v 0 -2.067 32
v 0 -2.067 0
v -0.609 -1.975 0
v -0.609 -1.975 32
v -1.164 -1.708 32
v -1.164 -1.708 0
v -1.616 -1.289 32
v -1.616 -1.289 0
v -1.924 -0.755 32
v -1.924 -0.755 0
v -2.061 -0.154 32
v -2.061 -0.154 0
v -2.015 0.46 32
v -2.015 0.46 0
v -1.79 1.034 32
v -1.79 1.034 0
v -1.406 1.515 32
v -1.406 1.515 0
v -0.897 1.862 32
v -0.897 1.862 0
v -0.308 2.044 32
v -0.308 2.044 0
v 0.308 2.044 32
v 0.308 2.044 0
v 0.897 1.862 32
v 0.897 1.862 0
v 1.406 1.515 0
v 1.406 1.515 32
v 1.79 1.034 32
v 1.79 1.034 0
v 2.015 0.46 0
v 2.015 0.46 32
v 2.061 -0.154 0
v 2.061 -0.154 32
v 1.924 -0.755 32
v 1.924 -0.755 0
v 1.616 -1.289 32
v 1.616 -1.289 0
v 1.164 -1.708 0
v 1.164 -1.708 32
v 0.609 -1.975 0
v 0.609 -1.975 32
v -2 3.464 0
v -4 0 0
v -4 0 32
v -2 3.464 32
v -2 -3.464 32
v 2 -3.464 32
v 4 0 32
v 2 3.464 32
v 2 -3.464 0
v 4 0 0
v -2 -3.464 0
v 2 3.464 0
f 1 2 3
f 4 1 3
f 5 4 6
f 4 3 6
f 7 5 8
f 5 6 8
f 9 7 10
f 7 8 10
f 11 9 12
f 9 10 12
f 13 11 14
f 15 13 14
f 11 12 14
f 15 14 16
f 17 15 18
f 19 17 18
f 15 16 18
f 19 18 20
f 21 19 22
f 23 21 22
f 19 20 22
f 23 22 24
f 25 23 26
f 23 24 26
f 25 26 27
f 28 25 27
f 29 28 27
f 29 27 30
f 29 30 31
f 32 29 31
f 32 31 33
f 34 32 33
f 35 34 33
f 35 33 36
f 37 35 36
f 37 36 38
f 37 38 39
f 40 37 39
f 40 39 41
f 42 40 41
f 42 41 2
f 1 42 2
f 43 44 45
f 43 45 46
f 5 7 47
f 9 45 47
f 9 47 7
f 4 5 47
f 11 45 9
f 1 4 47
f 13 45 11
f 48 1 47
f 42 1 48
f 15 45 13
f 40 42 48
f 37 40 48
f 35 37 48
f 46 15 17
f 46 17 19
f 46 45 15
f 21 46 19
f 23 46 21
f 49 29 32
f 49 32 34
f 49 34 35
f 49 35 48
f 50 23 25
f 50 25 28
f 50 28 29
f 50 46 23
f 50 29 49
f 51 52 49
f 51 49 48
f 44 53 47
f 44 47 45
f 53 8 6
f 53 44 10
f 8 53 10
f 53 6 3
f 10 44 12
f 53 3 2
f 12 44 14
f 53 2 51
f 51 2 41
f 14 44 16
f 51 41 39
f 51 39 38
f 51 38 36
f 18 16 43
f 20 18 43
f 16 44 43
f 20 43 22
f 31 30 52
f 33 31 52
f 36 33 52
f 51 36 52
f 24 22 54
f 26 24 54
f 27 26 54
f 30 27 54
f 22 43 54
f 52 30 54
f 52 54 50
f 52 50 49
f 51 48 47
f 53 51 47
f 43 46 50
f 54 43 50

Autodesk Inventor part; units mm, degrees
ref_plane "YZ Plane" through (0, 0, 0) normal (1, 0, 0) x (0, 1, 0)
ref_plane "XZ Plane" through (0, 0, 0) normal (0, 1, 0) x (-1, 0, 0)
ref_plane "XY Plane" through (0, 0, 0) normal (0, 0, 1) x (1, 0, 0)
sketch "Base" plane through (0, 0, 0) normal (0, 0, 1) x (1, 0, 0)
  circle A0 centre (0, 0) radius 2.5 construction
  circle A1 centre (0, 0) radius 4 construction
  line L0 (2, 3.4641) -> (4, 0)
  line L1 (4, 0) -> (2, -3.4641)
  line L2 (2, -3.4641) -> (-2, -3.4641)
  line L3 (-2, -3.4641) -> (-4, 0)
  line L4 (-4, 0) -> (-2, 3.4641)
  line L5 (-2, 3.4641) -> (2, 3.4641)
  line L6 (-5.6, 0) -> (5.6, 0) projected
  dimension "d1" = 8
  dimension "d0" = 5
extrude "BaseFeature" add sketch "Base" along normal blind 32
sketch "MountHole" plane through (0, 0, 32) normal (0, 0, 1) x (1, 0, 0)
  point P0 (0, 0)
hole "MountHoleFeature" at (0, 0, 32) direction (0, 0, -1) diameter 4.134 end through all thread size "M5x0.8" class "6H" standard "ISO Metric profile"
properties part number "M5-Standoff-32mm"
